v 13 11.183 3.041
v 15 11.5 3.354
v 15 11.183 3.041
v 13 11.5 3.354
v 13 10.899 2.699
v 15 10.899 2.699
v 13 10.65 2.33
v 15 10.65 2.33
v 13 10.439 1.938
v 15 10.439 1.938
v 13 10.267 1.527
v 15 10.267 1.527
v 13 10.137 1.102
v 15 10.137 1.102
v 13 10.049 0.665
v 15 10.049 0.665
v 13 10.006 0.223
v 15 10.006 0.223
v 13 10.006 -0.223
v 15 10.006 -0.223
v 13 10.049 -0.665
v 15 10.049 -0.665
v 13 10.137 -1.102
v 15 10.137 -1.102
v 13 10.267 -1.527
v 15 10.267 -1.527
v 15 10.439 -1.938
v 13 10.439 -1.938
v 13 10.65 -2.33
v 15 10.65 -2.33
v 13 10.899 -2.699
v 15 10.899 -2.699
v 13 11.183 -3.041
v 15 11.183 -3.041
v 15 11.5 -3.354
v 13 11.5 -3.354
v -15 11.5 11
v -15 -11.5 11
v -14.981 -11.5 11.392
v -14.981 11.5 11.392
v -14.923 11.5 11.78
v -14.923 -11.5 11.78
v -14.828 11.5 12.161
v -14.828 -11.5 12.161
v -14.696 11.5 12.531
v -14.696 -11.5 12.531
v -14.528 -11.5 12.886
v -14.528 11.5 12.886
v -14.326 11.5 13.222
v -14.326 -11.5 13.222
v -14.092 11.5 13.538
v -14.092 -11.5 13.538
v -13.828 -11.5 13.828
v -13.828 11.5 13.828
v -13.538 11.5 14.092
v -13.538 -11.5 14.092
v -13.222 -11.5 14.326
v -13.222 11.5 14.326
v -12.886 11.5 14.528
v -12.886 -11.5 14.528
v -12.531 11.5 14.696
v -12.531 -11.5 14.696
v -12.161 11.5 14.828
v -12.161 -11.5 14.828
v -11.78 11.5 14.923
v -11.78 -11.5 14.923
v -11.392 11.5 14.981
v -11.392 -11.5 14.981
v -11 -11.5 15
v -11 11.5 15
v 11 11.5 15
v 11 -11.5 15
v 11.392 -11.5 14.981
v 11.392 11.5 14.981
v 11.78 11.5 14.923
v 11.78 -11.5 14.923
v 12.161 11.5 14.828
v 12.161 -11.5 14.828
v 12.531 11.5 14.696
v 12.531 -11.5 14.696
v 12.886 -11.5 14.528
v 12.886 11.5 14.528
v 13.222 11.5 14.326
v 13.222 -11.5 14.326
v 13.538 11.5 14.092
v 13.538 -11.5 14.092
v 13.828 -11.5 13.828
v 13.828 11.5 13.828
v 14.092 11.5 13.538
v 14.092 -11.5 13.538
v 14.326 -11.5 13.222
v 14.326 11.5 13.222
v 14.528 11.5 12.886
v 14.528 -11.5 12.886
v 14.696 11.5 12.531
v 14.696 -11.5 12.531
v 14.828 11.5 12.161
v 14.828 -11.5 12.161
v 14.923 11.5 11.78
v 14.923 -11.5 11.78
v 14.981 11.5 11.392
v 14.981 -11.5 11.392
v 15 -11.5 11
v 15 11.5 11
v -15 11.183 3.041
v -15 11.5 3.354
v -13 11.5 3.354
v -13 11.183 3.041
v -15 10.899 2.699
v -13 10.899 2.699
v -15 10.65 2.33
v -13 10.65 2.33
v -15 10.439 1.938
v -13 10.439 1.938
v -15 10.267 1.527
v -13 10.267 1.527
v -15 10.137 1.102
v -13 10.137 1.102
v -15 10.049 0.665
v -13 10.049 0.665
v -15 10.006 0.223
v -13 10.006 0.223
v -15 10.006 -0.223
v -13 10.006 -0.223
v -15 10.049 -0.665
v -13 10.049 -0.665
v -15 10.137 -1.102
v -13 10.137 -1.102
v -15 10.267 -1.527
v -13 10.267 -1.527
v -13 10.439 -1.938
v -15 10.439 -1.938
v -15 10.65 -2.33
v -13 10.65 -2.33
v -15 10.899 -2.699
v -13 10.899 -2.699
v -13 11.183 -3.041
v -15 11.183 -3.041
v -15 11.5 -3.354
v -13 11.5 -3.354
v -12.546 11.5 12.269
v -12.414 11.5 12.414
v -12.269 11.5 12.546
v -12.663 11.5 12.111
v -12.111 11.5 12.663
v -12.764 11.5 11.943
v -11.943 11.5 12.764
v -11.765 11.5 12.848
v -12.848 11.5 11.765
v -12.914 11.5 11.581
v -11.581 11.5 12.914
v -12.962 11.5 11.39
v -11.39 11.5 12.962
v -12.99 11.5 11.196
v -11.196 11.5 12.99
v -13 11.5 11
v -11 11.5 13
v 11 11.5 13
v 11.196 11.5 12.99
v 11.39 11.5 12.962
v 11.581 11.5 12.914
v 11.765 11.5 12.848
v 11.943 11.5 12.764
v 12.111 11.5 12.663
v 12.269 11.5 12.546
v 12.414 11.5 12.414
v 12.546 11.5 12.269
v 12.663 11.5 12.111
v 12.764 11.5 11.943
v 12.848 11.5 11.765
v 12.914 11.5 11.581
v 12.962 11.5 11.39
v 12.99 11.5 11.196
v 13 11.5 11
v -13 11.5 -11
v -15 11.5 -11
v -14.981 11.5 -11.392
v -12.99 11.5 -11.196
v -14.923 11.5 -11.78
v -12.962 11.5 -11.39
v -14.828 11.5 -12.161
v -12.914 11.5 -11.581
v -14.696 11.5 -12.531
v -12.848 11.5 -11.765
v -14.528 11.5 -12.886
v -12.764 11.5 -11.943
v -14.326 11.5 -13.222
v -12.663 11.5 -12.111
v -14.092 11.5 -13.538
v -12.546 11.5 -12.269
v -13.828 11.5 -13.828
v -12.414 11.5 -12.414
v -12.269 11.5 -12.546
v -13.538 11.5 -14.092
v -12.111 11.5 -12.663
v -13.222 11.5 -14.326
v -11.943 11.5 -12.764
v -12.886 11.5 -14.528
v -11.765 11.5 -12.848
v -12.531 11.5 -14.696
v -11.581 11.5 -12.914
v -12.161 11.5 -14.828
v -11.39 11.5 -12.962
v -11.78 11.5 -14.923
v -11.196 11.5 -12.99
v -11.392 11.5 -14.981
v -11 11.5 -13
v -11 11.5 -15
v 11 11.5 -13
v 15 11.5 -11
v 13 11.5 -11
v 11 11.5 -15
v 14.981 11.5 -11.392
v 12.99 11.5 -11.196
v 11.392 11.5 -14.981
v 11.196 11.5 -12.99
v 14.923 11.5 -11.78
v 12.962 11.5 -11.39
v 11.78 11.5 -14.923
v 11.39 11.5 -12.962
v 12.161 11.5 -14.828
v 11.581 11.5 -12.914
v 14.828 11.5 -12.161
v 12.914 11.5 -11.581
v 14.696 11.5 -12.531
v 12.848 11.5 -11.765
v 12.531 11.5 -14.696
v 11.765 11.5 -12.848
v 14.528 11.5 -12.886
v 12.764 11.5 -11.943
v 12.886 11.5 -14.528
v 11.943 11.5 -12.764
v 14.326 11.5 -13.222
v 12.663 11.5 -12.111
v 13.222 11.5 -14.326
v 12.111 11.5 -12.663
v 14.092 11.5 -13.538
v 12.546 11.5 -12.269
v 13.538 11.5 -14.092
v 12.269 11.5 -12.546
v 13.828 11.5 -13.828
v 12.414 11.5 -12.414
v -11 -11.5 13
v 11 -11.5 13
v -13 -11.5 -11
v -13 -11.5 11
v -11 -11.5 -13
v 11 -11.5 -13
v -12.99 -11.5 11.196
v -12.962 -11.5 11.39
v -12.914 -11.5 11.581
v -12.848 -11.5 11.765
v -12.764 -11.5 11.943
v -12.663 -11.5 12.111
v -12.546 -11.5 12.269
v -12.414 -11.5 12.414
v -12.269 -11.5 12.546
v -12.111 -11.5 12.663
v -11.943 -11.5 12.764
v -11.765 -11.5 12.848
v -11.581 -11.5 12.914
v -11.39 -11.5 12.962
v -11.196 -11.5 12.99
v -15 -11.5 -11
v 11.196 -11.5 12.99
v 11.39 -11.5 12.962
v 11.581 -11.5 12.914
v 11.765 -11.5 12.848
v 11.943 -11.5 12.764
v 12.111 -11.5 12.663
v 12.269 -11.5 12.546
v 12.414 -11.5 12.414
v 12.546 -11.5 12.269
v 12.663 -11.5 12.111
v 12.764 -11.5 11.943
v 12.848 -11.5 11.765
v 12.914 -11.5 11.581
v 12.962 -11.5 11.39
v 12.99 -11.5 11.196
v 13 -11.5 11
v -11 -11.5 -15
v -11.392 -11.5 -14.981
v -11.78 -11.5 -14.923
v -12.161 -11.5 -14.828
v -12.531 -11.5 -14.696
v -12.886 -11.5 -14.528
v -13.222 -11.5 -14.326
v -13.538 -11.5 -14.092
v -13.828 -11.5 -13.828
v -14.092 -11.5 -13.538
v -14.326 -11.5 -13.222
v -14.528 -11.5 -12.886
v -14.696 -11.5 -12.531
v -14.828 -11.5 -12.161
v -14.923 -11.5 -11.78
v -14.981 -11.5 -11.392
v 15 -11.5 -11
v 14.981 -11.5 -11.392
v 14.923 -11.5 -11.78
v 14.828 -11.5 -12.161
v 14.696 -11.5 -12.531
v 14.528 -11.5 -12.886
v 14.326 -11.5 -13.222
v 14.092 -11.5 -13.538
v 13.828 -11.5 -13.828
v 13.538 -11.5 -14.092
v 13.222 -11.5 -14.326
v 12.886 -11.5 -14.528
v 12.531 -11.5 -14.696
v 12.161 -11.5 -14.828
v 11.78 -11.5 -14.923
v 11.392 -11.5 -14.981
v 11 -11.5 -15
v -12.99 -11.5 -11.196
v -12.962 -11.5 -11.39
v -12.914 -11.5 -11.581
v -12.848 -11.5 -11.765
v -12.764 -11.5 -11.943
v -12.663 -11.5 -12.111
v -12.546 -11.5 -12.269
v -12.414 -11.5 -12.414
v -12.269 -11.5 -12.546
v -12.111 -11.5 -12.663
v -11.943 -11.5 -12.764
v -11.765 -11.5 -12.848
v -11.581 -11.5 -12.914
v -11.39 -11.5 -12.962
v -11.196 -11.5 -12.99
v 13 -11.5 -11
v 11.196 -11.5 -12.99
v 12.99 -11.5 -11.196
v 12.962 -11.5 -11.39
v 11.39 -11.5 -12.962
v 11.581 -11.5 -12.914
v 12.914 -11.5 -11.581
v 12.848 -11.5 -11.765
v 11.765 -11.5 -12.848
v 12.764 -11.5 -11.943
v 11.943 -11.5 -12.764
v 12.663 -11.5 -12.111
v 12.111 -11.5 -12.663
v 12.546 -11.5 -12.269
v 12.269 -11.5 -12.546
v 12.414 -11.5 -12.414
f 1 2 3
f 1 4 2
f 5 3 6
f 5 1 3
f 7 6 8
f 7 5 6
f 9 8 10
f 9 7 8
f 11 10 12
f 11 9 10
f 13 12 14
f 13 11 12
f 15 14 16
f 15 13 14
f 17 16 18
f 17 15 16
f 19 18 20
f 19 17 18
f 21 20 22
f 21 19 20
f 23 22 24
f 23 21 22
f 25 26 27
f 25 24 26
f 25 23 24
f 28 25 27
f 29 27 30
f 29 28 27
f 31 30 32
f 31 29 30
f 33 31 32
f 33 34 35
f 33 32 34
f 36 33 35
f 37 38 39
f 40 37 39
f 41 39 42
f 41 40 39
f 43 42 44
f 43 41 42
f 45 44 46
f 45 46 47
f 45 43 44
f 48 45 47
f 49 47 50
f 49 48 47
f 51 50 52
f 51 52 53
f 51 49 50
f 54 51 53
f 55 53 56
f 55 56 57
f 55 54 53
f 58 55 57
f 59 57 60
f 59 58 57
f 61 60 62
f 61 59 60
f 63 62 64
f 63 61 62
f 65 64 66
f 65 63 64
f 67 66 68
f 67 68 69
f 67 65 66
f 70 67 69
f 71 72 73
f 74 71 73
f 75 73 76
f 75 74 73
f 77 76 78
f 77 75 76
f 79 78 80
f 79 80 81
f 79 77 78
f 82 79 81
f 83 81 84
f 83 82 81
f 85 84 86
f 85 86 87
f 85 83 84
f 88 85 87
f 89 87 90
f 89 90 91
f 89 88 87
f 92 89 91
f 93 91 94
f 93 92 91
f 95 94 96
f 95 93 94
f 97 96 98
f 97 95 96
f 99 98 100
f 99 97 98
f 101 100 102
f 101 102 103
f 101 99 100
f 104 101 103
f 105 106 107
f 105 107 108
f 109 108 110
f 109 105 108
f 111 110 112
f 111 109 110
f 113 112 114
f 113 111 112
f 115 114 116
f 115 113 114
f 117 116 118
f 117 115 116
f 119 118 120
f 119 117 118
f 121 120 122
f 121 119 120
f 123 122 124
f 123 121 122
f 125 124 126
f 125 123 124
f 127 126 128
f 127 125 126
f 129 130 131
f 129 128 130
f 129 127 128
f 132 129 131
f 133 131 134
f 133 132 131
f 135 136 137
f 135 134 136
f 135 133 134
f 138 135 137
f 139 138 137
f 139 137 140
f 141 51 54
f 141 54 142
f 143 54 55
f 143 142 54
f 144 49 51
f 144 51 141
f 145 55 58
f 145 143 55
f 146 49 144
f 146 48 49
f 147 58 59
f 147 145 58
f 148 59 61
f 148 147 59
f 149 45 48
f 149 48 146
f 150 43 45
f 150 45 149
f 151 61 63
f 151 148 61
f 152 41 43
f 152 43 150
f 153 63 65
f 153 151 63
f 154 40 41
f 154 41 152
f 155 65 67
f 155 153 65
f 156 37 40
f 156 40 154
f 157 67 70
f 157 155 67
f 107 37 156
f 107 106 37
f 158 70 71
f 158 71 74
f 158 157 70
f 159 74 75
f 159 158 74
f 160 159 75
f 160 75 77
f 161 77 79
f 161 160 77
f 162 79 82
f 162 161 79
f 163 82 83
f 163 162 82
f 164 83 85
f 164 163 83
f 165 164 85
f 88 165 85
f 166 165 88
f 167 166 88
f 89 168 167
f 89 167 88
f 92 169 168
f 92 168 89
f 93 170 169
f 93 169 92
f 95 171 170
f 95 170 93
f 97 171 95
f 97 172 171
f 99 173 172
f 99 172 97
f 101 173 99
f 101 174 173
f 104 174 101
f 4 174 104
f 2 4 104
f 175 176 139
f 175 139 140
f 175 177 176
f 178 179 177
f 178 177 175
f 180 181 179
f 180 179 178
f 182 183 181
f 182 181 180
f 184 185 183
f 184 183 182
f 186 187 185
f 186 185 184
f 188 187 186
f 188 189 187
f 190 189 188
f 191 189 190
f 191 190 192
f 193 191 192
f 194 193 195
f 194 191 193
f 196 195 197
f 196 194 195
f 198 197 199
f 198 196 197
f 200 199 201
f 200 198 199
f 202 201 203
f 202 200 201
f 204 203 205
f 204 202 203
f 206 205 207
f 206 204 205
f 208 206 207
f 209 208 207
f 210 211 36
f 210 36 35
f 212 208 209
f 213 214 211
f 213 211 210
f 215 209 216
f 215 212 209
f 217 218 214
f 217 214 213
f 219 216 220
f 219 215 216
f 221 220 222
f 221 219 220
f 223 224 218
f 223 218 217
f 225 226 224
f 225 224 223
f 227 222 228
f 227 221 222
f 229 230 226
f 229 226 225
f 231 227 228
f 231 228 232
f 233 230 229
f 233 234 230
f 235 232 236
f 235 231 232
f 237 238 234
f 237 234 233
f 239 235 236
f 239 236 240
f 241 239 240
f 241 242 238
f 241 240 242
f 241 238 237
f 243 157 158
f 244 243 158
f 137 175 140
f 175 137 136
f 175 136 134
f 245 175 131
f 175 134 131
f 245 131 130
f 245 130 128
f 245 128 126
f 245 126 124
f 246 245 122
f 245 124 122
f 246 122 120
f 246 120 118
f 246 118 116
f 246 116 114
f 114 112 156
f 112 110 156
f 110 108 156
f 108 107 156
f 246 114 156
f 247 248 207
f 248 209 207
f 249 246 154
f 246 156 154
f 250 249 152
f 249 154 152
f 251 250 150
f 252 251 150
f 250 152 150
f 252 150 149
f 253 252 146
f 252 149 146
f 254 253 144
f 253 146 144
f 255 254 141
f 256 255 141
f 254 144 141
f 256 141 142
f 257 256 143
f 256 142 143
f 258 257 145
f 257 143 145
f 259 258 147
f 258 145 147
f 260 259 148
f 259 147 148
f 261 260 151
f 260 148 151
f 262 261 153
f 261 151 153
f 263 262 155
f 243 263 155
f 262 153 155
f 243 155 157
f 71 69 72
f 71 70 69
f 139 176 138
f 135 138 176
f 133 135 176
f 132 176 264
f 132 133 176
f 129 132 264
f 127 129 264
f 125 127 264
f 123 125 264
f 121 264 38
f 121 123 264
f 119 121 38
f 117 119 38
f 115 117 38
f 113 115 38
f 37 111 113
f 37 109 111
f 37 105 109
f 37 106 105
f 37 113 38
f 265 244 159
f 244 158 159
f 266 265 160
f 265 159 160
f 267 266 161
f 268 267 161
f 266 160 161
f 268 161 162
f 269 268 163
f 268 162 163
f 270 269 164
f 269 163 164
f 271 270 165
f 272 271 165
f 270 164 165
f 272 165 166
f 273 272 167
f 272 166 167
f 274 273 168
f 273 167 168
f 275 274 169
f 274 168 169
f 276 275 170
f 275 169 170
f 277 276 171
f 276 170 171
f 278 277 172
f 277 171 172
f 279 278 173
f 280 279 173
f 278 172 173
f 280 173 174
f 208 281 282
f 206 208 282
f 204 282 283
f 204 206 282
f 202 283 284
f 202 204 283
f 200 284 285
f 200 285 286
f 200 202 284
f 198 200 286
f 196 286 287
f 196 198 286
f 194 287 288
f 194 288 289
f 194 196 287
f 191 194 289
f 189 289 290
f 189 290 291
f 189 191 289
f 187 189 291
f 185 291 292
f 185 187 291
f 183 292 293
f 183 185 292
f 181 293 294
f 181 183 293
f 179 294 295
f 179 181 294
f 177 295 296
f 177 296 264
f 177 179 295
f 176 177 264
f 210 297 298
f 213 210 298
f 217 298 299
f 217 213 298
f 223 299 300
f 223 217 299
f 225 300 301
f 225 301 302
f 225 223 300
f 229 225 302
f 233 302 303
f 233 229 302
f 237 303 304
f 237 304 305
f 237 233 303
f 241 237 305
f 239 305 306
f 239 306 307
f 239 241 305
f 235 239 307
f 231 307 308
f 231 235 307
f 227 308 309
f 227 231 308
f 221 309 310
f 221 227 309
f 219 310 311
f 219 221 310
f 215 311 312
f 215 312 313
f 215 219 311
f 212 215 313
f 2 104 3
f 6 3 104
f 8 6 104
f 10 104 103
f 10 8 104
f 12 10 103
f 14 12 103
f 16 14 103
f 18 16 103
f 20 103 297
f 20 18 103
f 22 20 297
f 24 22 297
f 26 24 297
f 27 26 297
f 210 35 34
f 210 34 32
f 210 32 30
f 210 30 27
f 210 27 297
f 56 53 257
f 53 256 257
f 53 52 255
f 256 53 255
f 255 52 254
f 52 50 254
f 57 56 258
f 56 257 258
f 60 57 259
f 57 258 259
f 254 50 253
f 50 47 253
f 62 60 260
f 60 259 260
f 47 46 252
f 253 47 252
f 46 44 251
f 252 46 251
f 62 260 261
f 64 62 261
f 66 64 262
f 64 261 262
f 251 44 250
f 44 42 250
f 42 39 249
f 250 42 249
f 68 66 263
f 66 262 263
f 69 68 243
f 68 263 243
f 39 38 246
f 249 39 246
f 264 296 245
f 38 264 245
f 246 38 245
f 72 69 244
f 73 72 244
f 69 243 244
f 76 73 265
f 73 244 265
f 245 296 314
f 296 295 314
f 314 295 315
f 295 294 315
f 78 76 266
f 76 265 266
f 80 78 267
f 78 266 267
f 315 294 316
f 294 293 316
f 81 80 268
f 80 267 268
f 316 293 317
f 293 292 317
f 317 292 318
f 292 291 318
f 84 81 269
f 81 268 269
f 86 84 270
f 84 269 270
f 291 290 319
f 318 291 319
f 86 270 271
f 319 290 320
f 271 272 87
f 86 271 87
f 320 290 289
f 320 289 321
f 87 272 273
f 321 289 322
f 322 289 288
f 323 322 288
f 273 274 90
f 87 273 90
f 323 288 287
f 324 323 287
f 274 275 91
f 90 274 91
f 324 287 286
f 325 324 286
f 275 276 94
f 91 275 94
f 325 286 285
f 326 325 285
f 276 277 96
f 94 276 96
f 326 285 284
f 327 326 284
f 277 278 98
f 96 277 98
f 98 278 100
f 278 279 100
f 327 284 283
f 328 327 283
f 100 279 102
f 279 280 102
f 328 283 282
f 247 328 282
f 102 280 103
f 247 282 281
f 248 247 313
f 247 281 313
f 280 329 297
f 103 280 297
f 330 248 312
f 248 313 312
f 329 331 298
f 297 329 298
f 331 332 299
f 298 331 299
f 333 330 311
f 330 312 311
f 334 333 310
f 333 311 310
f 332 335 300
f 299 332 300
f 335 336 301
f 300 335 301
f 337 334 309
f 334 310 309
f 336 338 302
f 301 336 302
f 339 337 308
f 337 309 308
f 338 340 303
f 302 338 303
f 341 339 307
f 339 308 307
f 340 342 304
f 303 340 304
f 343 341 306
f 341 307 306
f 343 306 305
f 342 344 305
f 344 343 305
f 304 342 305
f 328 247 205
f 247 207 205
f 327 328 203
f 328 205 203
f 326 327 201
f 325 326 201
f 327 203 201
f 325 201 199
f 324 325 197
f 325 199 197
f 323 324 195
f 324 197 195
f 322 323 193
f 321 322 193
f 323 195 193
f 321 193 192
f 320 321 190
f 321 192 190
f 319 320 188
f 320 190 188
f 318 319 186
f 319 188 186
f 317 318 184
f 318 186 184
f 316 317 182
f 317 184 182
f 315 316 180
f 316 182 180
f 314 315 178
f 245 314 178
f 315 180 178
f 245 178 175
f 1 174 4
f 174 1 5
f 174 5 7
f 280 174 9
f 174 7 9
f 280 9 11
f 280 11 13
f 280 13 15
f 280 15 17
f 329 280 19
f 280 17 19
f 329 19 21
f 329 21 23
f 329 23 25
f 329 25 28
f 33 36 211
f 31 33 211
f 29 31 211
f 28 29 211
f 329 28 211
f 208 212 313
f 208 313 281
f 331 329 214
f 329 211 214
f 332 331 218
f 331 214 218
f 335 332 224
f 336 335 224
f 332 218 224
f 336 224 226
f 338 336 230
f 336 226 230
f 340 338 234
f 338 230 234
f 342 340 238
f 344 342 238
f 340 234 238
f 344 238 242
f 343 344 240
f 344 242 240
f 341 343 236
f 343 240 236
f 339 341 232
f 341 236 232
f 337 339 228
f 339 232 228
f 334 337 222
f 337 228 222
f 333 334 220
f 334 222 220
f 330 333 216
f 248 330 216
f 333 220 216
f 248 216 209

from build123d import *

# Parameters (mm, degrees)
EXTRUDE_1_DEPTH          = 11.5
CUT_EXTRUDE_1_DEPTH      = 25.129857024
CUT_EXTRUDE_1_DEPTH_BACK = 25.129857024
SKETCH_2_R               = 4.5


with BuildPart() as part:
    # 草图1 → 凸台-拉伸1 (new, symmetric)
    with BuildSketch(Plane(origin=(0, 0, 0), x_dir=(1, 0, 0), z_dir=(0, 1, 0))):
        with BuildLine():
            Line((-11, -15), (11, -15))
            ThreePointArc((11, -15), (13.828427125, -13.828427125), (15, -11))
            Line((15, -11), (15, 11))
            ThreePointArc((15, 11), (13.828427125, 13.828427125), (11, 15))
            Line((11, 15), (-11, 15))
            ThreePointArc((-11, 15), (-13.828427125, 13.828427125), (-15, 11))
            Line((-15, 11), (-15, -11))
            ThreePointArc((-15, -11), (-13.828427125, -13.828427125), (-11, -15))
        make_face()
        with BuildLine():
            Line((-11, -13), (11, -13))
            ThreePointArc((11, -13), (12.414213562, -12.414213562), (13, -11))
            Line((13, -11), (13, 11))
            ThreePointArc((13, 11), (12.414213562, 12.414213562), (11, 13))
            Line((11, 13), (-11, 13))
            ThreePointArc((-11, 13), (-12.414213562, 12.414213562), (-13, 11))
            Line((-13, 11), (-13, -11))
            ThreePointArc((-13, -11), (-12.414213562, -12.414213562), (-11, -13))
        make_face(mode=Mode.SUBTRACT)
    extrude(amount=EXTRUDE_1_DEPTH, both=True)

    # 草图2 → 切除-拉伸1 (cut, two sides: drawn at the far end of the back side and taken through both)
    with BuildSketch(Plane(origin=(0, 0, 0), x_dir=(0, 0, -1), z_dir=(1, 0, 0)).offset(-CUT_EXTRUDE_1_DEPTH_BACK)):
        with Locations((0, 14.5)):
            Circle(SKETCH_2_R)
    extrude(amount=CUT_EXTRUDE_1_DEPTH + CUT_EXTRUDE_1_DEPTH_BACK, mode=Mode.SUBTRACT)


solid = part.part
